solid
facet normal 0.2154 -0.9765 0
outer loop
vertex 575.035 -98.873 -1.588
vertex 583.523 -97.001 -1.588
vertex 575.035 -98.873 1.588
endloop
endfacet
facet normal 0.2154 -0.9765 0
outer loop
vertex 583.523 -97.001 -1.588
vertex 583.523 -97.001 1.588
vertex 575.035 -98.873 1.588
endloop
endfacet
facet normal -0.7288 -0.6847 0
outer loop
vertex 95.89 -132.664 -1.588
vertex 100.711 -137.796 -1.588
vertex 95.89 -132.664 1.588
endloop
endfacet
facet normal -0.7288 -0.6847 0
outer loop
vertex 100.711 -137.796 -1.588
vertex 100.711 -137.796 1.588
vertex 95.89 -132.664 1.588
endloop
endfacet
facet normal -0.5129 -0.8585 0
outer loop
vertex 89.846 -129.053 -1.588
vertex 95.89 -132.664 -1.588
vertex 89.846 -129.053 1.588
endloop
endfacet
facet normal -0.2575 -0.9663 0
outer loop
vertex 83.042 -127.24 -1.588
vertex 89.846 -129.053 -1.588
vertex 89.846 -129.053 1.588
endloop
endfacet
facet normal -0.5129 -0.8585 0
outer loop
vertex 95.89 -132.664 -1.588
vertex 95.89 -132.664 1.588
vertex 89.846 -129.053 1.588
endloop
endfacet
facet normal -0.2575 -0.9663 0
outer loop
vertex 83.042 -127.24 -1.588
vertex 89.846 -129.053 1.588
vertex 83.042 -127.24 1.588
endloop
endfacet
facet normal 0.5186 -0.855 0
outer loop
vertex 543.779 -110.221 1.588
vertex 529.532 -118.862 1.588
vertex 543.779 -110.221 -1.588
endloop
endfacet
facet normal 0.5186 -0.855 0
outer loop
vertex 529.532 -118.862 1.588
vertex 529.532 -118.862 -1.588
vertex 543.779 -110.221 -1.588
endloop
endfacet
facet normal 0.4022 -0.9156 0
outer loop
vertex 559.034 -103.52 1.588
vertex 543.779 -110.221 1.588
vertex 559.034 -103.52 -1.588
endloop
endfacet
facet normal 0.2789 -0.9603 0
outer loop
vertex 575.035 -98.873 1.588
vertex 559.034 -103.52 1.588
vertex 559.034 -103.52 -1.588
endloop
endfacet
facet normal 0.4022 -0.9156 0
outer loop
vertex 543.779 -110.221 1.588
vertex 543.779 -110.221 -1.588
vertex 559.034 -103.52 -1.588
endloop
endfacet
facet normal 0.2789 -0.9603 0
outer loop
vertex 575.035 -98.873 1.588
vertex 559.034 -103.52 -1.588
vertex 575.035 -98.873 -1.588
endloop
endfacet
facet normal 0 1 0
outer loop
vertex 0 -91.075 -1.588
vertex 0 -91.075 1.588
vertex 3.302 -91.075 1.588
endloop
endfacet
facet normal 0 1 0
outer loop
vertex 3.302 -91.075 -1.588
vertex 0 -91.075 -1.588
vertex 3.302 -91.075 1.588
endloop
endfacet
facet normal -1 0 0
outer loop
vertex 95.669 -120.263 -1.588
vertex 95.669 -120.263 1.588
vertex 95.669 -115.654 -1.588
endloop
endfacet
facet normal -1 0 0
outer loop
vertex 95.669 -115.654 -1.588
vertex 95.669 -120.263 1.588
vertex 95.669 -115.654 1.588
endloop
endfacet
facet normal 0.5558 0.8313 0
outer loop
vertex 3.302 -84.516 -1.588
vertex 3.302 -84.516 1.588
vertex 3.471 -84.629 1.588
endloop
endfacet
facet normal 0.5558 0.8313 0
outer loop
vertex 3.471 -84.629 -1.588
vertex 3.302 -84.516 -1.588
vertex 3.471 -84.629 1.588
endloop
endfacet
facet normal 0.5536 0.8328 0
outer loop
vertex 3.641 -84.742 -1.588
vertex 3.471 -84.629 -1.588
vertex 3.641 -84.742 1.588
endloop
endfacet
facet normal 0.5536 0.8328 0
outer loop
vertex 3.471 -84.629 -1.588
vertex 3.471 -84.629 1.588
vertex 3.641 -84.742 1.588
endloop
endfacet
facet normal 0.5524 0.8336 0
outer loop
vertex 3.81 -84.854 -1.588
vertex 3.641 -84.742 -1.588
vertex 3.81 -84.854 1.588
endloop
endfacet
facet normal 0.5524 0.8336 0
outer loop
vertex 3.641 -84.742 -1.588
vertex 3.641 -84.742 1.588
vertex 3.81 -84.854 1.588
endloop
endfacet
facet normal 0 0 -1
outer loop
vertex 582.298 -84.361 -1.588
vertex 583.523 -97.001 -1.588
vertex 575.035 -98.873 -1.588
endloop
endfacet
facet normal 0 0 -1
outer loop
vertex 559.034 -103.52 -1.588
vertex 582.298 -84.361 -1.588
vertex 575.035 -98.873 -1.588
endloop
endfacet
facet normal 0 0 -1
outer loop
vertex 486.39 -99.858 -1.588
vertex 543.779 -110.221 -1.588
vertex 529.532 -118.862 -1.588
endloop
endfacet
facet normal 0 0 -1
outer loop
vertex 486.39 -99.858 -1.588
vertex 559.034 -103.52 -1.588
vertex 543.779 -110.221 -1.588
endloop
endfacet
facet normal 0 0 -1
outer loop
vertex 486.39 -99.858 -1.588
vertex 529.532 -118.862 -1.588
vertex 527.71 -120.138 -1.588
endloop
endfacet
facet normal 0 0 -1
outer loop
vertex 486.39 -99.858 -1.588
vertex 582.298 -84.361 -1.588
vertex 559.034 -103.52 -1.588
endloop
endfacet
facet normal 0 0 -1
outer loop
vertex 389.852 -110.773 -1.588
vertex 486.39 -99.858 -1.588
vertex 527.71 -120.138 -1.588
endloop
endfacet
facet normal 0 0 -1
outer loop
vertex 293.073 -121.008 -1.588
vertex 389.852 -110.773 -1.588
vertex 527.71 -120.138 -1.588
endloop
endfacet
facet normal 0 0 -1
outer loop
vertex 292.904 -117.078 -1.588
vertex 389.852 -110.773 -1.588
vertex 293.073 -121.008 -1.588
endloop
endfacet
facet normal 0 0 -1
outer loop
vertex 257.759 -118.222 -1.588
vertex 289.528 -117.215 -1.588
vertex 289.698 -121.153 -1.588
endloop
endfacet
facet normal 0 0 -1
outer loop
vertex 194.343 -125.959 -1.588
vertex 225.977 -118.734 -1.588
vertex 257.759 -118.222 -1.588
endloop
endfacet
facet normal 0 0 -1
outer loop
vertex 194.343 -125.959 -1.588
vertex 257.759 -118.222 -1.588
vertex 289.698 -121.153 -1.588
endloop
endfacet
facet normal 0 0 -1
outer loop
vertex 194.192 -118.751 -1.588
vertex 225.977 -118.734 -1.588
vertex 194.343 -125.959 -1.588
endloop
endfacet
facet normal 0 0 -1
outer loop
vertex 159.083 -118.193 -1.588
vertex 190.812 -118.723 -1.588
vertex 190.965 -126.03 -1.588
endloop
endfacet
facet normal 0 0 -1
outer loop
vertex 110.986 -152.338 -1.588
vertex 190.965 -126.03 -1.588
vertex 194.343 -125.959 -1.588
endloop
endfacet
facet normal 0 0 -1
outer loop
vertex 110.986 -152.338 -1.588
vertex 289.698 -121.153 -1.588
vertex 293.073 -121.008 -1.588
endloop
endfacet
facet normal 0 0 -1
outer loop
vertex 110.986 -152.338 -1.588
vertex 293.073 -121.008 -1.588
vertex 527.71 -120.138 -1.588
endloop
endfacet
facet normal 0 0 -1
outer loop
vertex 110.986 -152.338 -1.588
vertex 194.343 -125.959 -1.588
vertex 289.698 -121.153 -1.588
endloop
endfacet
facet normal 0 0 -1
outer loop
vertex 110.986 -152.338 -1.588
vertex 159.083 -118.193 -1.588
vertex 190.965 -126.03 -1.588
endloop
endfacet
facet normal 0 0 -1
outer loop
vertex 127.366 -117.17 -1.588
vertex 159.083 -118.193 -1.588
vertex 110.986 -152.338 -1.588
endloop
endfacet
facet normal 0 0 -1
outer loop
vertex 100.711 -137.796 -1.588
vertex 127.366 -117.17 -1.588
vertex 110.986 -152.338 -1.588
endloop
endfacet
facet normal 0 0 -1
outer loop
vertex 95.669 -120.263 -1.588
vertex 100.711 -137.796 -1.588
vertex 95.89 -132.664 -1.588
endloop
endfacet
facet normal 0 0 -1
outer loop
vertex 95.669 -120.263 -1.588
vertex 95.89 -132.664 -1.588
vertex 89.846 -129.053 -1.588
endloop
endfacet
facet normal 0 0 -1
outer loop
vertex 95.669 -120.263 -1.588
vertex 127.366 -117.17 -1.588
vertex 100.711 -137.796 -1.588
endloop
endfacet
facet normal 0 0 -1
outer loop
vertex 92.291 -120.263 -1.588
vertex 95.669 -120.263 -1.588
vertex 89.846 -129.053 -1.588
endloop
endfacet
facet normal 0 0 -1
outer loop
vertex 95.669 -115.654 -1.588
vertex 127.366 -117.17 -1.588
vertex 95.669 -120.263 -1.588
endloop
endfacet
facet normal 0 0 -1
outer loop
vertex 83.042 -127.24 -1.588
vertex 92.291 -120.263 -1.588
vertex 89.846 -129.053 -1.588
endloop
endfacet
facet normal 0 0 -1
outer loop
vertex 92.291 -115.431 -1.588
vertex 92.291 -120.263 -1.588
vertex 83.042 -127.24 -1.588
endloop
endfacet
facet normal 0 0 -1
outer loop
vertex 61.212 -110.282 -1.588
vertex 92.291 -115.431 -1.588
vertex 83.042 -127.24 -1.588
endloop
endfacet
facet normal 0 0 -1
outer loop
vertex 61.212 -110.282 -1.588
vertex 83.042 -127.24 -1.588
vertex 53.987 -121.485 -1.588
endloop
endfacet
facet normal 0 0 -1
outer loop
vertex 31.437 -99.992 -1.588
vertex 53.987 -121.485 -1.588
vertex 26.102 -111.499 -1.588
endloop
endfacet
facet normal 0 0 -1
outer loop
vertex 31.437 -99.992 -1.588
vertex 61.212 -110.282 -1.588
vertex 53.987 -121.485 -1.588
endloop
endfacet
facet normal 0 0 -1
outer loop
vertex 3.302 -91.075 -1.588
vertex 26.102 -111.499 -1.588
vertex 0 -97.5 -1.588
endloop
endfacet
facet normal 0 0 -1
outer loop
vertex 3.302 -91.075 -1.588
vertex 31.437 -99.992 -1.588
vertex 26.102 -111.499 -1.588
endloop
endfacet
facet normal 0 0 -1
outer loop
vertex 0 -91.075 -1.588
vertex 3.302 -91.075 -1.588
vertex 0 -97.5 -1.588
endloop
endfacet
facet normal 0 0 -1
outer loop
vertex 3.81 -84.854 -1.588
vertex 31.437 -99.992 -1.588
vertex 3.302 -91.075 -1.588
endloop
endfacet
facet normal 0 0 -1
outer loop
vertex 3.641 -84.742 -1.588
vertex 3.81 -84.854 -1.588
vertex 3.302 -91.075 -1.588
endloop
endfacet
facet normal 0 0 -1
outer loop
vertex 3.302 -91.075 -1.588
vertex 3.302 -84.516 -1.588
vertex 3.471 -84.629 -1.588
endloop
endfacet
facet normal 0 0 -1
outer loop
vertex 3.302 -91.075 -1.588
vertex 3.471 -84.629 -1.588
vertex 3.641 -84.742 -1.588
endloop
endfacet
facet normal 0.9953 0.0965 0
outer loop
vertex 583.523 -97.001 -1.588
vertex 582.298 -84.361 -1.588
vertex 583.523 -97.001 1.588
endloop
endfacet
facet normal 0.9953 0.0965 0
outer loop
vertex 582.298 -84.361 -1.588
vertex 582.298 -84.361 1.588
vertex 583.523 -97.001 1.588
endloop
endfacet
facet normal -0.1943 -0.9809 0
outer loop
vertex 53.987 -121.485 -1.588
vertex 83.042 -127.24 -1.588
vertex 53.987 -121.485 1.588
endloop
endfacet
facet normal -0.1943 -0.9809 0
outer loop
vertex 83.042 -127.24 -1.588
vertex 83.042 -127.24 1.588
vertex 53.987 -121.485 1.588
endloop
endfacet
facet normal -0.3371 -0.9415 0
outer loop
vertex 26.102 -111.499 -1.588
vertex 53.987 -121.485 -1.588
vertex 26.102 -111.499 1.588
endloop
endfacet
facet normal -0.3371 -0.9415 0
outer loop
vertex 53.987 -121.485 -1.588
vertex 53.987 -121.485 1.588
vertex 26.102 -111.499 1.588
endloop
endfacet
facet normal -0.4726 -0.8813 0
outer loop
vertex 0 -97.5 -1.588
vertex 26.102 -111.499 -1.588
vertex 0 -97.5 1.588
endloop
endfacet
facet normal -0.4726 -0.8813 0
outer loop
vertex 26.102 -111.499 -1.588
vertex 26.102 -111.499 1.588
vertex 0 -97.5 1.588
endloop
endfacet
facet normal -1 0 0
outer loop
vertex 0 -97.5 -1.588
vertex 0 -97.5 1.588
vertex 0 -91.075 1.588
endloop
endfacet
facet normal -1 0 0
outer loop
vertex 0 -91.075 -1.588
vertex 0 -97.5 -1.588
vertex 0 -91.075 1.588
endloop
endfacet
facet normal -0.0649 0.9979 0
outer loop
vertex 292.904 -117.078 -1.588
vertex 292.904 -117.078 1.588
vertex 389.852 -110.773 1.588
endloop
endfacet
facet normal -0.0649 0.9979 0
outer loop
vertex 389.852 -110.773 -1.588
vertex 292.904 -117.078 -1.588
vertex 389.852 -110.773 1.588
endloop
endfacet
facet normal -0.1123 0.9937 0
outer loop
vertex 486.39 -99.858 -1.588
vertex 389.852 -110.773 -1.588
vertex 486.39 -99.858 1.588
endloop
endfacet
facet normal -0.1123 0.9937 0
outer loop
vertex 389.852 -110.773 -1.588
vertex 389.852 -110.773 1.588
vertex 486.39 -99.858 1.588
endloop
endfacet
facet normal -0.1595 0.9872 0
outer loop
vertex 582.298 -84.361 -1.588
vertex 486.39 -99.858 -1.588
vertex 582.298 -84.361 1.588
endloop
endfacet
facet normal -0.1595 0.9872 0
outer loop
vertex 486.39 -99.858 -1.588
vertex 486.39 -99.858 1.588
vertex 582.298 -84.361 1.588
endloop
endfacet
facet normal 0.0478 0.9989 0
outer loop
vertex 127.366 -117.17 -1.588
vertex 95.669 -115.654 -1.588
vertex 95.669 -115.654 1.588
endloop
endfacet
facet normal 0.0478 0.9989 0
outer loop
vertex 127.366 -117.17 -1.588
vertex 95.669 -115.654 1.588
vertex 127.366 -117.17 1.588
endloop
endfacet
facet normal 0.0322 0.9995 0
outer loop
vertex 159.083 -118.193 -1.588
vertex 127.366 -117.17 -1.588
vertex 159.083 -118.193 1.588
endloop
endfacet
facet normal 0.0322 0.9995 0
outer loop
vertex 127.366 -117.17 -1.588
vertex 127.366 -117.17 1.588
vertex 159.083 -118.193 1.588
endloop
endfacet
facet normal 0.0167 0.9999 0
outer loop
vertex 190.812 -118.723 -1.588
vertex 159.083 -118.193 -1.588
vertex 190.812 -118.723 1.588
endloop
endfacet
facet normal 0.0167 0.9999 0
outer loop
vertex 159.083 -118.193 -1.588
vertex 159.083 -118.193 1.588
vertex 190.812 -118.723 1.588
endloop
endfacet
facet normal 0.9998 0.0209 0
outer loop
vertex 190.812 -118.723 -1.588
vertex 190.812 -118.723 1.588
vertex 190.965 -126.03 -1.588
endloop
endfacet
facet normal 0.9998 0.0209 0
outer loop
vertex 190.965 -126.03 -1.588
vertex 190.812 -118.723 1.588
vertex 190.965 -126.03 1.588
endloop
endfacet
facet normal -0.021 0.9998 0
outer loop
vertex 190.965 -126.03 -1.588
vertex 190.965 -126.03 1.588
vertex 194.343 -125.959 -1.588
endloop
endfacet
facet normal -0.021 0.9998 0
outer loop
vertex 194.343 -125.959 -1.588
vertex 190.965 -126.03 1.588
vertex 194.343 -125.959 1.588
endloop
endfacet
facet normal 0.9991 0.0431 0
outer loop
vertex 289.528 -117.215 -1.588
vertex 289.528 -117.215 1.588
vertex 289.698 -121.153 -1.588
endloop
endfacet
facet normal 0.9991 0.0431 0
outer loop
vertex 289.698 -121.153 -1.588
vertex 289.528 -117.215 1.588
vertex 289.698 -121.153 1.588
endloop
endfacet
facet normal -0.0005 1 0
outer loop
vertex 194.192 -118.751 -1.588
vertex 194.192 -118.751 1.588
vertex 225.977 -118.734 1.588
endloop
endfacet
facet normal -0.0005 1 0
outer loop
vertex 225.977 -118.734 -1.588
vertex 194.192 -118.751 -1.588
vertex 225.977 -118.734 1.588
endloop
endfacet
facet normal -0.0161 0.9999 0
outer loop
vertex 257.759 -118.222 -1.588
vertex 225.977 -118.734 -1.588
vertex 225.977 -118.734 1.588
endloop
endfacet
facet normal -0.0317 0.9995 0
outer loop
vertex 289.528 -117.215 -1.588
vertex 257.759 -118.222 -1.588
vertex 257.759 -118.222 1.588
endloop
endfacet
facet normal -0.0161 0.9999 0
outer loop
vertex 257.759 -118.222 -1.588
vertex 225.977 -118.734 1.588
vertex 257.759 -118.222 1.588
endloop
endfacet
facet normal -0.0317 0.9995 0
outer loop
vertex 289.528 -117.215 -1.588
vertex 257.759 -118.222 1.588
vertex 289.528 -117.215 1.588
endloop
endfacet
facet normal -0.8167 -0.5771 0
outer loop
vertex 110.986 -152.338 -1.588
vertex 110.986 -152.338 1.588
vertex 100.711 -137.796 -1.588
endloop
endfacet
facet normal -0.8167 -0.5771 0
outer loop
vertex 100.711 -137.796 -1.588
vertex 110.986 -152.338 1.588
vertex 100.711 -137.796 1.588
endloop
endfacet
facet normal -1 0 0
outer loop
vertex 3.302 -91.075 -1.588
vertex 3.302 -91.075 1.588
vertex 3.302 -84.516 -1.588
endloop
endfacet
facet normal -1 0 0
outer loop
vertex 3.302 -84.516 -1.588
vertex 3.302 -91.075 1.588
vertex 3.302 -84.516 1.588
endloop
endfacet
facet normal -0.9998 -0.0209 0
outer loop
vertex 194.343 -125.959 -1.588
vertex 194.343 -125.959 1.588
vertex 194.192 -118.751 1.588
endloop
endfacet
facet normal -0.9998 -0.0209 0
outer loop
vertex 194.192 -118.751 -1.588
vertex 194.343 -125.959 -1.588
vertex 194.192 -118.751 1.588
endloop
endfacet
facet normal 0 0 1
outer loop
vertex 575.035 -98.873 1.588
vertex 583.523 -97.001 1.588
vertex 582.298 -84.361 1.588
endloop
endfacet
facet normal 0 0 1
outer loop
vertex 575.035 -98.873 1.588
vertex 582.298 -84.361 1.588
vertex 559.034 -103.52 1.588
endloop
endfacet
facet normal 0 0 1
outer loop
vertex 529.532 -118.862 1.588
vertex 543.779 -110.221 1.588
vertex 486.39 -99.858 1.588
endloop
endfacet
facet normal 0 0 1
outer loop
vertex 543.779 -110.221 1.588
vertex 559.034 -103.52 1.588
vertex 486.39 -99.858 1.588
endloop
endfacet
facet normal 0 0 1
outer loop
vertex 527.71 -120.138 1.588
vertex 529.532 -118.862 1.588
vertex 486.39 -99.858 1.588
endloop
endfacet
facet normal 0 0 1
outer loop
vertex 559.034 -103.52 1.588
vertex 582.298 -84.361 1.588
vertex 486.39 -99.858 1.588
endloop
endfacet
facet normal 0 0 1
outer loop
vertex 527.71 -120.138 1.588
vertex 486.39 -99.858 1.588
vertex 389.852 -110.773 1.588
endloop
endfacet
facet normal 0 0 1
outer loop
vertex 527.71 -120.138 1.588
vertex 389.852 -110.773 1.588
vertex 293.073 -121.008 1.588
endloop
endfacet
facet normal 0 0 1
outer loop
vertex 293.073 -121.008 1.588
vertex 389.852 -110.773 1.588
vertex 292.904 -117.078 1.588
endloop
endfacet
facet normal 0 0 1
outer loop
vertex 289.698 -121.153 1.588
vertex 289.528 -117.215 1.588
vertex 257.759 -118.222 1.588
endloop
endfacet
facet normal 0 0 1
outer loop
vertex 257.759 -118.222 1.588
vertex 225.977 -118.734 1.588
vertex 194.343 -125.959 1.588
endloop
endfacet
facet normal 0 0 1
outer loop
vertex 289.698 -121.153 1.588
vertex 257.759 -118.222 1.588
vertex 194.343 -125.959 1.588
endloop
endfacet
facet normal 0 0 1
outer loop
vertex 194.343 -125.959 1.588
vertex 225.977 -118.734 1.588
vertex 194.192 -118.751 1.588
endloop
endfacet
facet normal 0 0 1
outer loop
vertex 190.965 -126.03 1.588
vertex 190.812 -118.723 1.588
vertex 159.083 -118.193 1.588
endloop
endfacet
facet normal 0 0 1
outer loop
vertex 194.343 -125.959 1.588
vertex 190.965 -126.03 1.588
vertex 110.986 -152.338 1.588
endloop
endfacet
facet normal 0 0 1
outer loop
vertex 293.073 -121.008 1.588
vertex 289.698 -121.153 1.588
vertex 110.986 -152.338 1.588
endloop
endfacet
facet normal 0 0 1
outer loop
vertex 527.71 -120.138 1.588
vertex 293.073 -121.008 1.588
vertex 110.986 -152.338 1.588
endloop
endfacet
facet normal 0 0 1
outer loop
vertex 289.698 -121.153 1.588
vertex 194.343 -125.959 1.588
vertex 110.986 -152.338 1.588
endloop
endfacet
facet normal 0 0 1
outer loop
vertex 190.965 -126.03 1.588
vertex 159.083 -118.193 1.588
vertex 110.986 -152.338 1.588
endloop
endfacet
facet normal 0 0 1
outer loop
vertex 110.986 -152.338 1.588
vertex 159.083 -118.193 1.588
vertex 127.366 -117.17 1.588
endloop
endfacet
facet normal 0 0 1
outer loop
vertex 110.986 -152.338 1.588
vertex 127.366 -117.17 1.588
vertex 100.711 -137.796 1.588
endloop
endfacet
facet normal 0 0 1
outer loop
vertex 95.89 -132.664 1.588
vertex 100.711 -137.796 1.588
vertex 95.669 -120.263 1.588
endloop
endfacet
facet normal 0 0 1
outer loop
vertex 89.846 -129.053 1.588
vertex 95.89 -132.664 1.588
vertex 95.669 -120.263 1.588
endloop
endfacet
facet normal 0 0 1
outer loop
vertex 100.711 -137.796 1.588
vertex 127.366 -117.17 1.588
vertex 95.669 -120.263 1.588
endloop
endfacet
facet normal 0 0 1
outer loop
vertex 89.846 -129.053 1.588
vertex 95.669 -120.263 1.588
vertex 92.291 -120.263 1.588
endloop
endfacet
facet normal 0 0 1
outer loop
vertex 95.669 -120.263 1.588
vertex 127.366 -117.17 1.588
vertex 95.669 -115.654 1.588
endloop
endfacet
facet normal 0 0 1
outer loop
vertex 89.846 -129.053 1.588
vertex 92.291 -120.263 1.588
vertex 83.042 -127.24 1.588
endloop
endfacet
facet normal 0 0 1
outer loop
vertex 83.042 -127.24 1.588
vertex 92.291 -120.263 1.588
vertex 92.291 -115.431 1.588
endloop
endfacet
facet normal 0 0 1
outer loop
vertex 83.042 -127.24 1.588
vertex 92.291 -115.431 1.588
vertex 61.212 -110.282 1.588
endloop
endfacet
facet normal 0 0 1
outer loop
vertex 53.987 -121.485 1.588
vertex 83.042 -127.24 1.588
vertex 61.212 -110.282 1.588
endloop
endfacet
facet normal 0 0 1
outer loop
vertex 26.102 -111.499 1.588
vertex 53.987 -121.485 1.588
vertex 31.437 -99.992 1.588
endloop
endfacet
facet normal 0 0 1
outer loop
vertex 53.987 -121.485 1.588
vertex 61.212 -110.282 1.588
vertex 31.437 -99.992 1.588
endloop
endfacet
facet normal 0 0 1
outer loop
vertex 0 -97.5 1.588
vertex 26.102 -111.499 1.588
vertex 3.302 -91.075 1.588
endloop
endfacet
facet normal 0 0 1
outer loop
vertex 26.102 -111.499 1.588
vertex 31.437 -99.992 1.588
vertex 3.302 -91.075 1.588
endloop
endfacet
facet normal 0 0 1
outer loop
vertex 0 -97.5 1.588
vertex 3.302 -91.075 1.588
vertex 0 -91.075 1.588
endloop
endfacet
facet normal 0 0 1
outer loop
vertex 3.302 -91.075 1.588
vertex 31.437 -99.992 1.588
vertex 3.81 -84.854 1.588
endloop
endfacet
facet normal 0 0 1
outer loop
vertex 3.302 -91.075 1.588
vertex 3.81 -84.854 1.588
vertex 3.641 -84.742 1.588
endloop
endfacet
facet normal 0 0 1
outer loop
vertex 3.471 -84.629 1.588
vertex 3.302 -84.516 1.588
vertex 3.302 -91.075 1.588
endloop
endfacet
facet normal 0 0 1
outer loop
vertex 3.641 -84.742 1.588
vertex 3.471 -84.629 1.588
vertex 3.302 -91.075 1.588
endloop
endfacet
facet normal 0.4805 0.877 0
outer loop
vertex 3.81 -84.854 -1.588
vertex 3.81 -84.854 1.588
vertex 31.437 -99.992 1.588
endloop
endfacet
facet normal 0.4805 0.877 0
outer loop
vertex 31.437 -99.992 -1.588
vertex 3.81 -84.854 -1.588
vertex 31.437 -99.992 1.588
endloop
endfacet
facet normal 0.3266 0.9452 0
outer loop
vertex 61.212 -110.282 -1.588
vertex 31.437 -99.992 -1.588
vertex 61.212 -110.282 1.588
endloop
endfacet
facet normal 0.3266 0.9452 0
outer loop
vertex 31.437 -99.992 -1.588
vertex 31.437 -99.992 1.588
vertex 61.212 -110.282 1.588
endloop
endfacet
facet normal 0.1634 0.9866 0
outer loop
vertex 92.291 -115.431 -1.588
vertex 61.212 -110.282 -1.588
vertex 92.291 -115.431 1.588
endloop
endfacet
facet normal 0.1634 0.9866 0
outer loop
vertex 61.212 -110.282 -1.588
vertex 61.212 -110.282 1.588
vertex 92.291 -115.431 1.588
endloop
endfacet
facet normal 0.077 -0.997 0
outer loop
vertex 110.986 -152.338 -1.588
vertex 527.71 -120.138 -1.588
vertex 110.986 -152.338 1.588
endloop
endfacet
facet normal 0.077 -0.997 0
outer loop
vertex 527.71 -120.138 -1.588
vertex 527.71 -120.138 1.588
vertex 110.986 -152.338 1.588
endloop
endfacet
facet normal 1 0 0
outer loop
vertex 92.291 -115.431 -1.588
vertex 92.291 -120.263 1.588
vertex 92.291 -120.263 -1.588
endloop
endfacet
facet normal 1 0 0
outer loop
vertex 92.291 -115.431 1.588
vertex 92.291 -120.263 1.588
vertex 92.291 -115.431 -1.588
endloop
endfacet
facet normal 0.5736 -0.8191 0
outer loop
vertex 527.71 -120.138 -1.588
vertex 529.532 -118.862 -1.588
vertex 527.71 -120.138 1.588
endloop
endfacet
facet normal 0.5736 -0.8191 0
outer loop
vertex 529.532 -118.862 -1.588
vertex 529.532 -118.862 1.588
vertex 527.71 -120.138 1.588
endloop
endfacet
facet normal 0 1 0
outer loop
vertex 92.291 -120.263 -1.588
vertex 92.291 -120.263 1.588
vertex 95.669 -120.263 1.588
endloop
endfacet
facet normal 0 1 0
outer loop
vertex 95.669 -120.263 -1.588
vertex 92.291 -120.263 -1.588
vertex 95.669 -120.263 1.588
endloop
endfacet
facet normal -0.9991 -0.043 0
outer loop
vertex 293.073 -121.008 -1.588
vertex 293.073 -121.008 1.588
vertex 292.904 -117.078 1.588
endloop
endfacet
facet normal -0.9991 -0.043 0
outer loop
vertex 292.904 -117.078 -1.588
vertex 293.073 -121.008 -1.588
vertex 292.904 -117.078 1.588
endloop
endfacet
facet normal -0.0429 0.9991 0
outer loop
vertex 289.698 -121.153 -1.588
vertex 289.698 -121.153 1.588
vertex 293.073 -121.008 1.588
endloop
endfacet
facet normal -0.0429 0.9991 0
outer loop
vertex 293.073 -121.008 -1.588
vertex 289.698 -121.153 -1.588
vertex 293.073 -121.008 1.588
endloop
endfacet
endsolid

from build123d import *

# Parameters (mm, degrees)
BOSS_EXTRUDE1_DEPTH = 1.5875
FILLET1_R           = 127
FILLET2_R           = 25.4
SKETCH2_W           = 3.302
SKETCH2_H           = 12.7
SKETCH2_W_2         = 3.3782
CUT_EXTRUDE1_DEPTH  = 4.175


with BuildPart() as part:
    # Sketch1 → Boss-Extrude1 (new body, symmetric)
    with BuildSketch(Plane.XY):
        with BuildLine():
            Line((0, -97.5), (0, -91.458484162))
            Line((0, -91.458484162), (0, -84.854484162))
            Line((0, -84.854484162), (0, -82.26))
            ThreePointArc((0, -82.26), (1.897011907, -83.568972596), (3.81, -84.854484162))
            ThreePointArc((3.81, -84.854484162), (46.908813116, -106.039615985), (93.98, -115.559115329))
            ThreePointArc((93.98, -115.559115329), (339.07784145, -114.653396415), (582.298149945, -84.360596188))
            Line((582.298149945, -84.360596188), (583.523082908, -97.001384899))
            Line((583.523082908, -97.001384899), (550.289320925, -104.328123724))
            Line((550.289320925, -104.328123724), (527.710073756, -120.138282799))
            Line((527.710073756, -120.138282799), (110.986490966, -152.337740244))
            Line((110.986490966, -152.337740244), (93.98, -128.27))
            ThreePointArc((93.98, -128.27), (45.056564108, -118.790242286), (0, -97.5))
        make_face()
    extrude(amount=BOSS_EXTRUDE1_DEPTH, both=True)

    # Fillet1
    fillet1_edges = [part.edges().sort_by_distance(p)[0] for p in [
        (550.289320925, -104.328123724, -0.79375),
    ]]
    fillet(fillet1_edges, radius=FILLET1_R)

    # Fillet2
    fillet2_edges = [part.edges().sort_by_distance(p)[0] for p in [
        (93.98, -128.27, 0.79375),
    ]]
    fillet(fillet2_edges, radius=FILLET2_R)

    # Sketch2 → Cut-Extrude1 (cut, through all)
    with BuildSketch(Plane.XY.offset(1.5875)):
        with Locations((1.651, -84.72524711)):
            Rectangle(SKETCH2_W, SKETCH2_H)
        with Locations((93.98, -113.91339143)):
            Rectangle(SKETCH2_W_2, SKETCH2_H)
        Polygon((190.965218572, -126.030176605), (194.342678534, -125.959469873), (194.076863752, -113.262251969), (190.69940379, -113.332958701), align=None)
        Polygon((289.697985722, -121.153429558), (293.07306112, -121.008166691), (292.800010619, -114.664040004), (289.424935222, -114.80930287), align=None)
    extrude(amount=-CUT_EXTRUDE1_DEPTH, mode=Mode.SUBTRACT)


solid = part.part
